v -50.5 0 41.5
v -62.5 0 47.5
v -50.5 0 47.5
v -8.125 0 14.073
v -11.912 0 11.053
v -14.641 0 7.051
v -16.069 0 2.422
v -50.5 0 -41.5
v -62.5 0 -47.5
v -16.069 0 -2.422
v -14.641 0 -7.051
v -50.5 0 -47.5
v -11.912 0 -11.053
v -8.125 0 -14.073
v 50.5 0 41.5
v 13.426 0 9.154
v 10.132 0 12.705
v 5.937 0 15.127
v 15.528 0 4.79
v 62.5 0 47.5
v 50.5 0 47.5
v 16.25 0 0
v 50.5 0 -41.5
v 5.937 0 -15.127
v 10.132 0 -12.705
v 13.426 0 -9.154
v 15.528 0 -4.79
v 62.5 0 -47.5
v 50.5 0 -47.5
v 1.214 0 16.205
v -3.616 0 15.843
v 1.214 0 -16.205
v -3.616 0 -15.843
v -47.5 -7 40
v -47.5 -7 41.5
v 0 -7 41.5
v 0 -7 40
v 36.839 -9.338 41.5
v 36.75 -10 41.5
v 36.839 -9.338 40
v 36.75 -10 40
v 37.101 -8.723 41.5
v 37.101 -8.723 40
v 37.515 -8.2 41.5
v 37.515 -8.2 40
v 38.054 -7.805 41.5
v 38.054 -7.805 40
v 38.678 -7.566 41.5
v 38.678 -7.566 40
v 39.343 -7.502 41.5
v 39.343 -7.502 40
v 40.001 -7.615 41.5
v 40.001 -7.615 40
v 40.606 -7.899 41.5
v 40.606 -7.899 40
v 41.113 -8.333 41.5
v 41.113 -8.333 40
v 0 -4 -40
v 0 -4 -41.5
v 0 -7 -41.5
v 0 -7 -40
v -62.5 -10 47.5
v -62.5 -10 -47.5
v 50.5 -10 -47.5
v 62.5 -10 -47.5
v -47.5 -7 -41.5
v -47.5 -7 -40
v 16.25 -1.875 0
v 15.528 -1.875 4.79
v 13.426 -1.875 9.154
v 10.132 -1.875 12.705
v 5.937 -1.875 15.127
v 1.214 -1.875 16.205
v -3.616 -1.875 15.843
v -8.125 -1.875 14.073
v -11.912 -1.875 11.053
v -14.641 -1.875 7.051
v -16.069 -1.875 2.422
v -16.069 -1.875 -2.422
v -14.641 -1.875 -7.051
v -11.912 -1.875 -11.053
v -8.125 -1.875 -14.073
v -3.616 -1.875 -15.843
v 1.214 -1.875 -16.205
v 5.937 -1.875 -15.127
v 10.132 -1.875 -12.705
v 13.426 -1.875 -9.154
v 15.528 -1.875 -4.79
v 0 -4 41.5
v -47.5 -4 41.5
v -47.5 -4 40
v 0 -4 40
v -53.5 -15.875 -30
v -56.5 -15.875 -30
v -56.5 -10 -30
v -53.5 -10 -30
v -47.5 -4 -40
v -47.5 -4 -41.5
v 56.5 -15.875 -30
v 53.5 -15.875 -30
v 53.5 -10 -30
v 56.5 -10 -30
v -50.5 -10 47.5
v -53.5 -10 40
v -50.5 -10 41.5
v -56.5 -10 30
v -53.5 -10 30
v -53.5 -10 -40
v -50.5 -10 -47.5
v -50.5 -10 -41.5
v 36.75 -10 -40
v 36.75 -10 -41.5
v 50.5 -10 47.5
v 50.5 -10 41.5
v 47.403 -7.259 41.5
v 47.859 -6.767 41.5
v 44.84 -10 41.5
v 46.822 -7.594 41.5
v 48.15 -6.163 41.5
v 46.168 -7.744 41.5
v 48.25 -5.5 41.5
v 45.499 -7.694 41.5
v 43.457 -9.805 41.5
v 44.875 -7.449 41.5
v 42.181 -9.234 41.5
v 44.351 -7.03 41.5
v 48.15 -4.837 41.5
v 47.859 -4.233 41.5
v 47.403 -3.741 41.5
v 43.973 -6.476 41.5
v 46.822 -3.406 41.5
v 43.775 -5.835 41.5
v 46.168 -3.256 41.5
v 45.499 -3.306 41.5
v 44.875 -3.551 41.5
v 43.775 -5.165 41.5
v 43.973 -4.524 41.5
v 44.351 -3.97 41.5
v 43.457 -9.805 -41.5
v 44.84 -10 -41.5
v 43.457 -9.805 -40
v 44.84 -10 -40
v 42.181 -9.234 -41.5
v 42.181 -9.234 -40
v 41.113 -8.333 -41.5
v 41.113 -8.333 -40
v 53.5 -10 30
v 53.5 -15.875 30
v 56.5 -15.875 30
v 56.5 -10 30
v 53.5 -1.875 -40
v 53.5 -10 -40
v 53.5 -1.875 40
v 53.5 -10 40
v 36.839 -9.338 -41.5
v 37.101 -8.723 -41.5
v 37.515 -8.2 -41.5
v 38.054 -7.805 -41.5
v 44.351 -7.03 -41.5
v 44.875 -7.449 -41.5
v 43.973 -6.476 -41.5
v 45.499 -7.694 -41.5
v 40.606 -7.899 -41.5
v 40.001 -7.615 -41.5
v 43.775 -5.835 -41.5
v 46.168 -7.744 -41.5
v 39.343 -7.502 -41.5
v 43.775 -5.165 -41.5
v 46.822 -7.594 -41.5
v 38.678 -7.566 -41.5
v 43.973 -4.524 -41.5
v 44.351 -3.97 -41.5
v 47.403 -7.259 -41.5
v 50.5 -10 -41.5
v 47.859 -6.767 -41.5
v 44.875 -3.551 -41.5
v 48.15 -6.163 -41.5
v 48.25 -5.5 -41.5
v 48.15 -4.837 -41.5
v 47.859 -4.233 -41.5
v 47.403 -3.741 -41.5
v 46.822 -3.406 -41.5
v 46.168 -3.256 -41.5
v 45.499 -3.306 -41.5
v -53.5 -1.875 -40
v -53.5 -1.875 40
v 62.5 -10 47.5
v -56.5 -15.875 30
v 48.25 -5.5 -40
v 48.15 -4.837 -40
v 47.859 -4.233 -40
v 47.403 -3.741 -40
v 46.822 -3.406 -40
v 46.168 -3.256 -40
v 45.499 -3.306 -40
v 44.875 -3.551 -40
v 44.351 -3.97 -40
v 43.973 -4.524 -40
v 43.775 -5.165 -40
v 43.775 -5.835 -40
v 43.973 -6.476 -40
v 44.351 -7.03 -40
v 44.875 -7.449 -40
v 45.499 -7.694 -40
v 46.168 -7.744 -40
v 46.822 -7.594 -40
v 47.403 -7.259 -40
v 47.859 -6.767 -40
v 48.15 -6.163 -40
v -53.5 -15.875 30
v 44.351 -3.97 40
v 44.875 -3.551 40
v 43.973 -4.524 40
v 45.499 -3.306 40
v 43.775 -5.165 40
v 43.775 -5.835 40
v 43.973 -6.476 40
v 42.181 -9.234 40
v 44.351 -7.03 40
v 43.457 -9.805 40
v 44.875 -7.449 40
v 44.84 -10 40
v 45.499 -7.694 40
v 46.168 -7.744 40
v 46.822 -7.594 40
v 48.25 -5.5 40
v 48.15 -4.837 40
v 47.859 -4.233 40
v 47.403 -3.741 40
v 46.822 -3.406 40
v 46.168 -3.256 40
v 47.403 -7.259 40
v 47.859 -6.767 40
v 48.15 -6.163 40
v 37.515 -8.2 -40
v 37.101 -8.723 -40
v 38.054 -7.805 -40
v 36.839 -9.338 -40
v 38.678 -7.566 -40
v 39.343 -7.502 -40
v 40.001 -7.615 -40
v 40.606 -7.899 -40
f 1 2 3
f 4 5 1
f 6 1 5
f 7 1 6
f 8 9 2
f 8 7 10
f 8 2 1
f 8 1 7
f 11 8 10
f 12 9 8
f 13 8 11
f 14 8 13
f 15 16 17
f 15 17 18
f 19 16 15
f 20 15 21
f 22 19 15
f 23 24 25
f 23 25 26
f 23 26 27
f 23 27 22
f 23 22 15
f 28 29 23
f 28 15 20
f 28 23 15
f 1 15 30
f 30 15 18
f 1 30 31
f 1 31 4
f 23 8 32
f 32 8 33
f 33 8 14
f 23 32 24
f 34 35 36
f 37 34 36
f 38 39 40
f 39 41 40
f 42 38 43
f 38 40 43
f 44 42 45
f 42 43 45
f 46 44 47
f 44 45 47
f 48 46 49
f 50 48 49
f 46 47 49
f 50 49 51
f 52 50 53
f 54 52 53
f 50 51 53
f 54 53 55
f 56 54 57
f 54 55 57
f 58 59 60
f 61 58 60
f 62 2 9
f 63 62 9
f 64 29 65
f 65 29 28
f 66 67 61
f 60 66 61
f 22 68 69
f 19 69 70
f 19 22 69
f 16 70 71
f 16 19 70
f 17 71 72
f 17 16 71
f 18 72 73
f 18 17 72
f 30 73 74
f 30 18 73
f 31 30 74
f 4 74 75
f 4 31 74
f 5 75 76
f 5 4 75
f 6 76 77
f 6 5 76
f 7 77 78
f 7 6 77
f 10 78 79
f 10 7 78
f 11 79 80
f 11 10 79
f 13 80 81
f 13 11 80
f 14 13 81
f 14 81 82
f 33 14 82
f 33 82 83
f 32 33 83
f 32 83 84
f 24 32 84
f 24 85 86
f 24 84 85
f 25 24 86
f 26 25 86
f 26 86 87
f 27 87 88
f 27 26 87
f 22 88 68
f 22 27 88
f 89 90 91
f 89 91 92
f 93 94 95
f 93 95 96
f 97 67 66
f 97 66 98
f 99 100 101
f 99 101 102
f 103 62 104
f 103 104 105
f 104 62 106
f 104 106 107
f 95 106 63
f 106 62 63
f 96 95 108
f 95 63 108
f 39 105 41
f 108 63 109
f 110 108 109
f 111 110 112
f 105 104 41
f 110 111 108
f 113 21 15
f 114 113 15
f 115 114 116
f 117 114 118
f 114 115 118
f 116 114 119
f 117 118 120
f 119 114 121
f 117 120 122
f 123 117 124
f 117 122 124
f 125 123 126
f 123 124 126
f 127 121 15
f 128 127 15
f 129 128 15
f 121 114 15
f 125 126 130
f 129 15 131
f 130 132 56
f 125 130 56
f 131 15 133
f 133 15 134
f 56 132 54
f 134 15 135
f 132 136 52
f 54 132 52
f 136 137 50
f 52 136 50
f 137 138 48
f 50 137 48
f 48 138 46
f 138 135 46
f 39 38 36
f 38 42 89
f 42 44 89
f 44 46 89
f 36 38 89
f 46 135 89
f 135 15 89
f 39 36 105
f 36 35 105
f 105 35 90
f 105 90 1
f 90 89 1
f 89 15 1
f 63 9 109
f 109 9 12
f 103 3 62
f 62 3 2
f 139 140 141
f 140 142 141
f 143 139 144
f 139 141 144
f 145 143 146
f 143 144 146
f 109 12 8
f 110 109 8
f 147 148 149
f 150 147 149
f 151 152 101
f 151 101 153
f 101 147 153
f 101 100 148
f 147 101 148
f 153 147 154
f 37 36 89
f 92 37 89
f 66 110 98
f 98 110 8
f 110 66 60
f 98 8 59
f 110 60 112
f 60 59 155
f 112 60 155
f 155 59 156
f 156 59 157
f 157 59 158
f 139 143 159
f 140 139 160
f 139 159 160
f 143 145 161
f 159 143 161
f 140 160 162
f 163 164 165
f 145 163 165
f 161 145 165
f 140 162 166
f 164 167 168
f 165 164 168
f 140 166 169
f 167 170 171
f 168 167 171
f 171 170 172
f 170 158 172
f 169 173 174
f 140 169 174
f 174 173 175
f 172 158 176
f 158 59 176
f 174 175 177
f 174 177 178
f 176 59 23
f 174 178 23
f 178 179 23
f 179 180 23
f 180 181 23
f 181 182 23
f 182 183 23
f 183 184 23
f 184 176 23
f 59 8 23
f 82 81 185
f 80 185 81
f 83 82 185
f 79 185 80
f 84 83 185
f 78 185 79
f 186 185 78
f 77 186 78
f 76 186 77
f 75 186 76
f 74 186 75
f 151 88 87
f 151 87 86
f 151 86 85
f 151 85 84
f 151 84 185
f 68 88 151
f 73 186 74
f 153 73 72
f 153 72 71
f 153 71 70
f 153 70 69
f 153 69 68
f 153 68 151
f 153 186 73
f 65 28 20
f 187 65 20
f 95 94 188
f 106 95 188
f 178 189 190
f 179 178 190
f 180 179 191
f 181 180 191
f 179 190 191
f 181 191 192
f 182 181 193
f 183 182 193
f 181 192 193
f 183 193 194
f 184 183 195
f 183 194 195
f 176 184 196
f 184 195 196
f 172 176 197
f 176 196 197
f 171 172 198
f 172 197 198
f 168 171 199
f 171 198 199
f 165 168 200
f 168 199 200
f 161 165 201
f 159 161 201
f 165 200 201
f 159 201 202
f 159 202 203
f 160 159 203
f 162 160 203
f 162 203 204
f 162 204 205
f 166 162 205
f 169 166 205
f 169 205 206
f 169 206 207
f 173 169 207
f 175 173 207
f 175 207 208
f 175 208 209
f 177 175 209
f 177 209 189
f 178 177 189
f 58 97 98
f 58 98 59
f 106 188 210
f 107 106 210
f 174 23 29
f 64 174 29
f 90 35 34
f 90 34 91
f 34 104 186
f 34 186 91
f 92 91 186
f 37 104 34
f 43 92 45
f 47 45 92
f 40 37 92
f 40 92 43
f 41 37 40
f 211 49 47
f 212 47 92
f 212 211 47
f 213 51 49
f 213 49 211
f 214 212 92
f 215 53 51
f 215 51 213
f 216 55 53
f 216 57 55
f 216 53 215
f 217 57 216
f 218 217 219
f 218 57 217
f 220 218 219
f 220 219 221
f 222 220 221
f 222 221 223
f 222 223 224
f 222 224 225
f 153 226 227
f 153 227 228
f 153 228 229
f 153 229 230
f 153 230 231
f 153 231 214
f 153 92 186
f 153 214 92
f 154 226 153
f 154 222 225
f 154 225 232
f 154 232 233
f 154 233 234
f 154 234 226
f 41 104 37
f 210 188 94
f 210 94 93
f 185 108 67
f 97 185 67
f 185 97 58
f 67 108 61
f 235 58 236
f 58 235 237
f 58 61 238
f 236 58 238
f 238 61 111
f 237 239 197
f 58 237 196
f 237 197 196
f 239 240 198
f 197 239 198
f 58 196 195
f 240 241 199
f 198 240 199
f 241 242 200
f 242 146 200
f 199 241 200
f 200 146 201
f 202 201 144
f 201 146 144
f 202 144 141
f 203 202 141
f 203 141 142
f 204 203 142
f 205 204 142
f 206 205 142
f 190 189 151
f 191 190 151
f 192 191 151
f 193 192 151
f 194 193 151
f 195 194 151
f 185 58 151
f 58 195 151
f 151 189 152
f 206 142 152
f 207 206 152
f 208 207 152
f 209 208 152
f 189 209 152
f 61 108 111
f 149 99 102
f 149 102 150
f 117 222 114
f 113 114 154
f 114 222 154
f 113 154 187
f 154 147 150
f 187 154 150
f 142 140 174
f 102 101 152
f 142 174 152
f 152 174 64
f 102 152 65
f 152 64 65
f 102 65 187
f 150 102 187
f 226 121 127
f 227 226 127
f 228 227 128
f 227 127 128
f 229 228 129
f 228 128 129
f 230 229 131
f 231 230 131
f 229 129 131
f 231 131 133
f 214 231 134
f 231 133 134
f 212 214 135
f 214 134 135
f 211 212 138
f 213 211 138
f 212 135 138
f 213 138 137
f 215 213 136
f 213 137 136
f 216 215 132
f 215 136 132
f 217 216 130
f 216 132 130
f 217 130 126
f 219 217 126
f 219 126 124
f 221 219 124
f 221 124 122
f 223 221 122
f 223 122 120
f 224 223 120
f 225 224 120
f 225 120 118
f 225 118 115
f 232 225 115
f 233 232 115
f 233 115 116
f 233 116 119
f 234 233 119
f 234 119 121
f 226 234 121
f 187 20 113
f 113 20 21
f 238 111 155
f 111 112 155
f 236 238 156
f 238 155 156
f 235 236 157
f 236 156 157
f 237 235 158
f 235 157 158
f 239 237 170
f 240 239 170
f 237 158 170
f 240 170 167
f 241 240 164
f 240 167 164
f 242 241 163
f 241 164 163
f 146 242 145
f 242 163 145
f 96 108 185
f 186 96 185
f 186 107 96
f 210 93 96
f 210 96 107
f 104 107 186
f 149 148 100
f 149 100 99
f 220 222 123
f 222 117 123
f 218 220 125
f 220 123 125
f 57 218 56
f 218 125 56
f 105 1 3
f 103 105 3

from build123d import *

# Parameters (mm, degrees)
F0_R      = 16.25
F1_DEPTH  = 15.875
F2_W      = 139.2096877098
F2_H      = 115.5483946204
F2_W_2    = 113
F2_H_2    = 80
F3_DEPTH  = 5.875
F4_W      = 107
F4_H      = 80
F5_DEPTH  = 14
F6_W      = 120.5911301091
F6_H      = 13.1527084535
F6_W_2    = 121.3300417974
F6_H_2    = 15.8128053223
F7_DEPTH  = 5.875
F8_R      = 1.5
F8_W      = 89
F8_H      = 3
F9_DEPTH  = 100
F10_W     = 42.4407012761
F10_H     = 10
F11_DEPTH = 1.5
F12_W     = 42.5221920013
F12_H     = 10
F13_DEPTH = 1.5
F14_R     = 2.5
F15_DEPTH = 95.5
F16_R     = 2.25
F17_DEPTH = 200
F18_R     = 5


with BuildPart() as f1:
    # F0 (on Front) → F1 (new body)
    with BuildSketch(Plane.XZ):
        Polygon((-50.5, 47.5), (-62.5, 47.5), (-62.5, -47.5), (-50.5, -47.5), (-50.5, -41.5), (50.5, -41.5), (50.5, -47.5), (62.5, -47.5), (62.5, 47.5), (50.5, 47.5), (50.5, 41.5), (-50.5, 41.5), align=None)
        Circle(F0_R, mode=Mode.SUBTRACT)
    extrude(amount=F1_DEPTH)

    # F2 (on face) → F3 (cut)
    with BuildSketch(Plane.XZ.offset(15.875)):
        Rectangle(F2_W, F2_H)
        Rectangle(F2_W_2, F2_H_2, mode=Mode.SUBTRACT)
    extrude(amount=-F3_DEPTH, mode=Mode.SUBTRACT)

    # F4 (on face) → F5 (cut)
    with BuildSketch(Plane.XZ.offset(15.875)):
        Rectangle(F4_W, F4_H)
    extrude(amount=-F5_DEPTH, mode=Mode.SUBTRACT)

    # F6 (on face) → F7 (cut)
    with BuildSketch(Plane.XZ.offset(15.875)):
        with Locations((0.0607829645, 36.5763542267)):
            Rectangle(F6_W, F6_H)
        with Locations((1.0213727103, -37.9064026611)):
            Rectangle(F6_W_2, F6_H_2)
    extrude(amount=-F7_DEPTH, mode=Mode.SUBTRACT)

    # F8 (on face) → F9 (cut)
    with BuildSketch(Plane.XY.offset(41.5)):
        with Locations((46, -5.5)):
            Circle(F8_R)
        with Locations((-3, -5.5)):
            Rectangle(F8_W, F8_H)
    extrude(amount=-F9_DEPTH, mode=Mode.SUBTRACT)

    # F10 (on face) → F11 (join)
    with BuildSketch(Plane.XY.offset(41.5)):
        with Locations((21.220350638, -5)):
            Rectangle(F10_W, F10_H)
    extrude(amount=-F11_DEPTH)

    # F12 (on face) → F13 (join)
    with BuildSketch(Plane(origin=(0, 0, -41.5), x_dir=(1, 0, 0), z_dir=(0, 0, -1))):
        with Locations((21.2610960007, 5)):
            Rectangle(F12_W, F12_H)
    extrude(amount=-F13_DEPTH)

    # F14 (on face) → F15 (cut)
    with BuildSketch(Plane(origin=(0, 0, -41.5), x_dir=(1, 0, 0), z_dir=(0, 0, -1))):
        with Locations((39.25, 10)):
            Circle(F14_R)
    extrude(amount=-F15_DEPTH, mode=Mode.SUBTRACT)

    # F16 (on face) → F17 (cut)
    with BuildSketch(Plane.XY.offset(41.5)):
        with Locations((46, -5.5)):
            Circle(F16_R)
    extrude(amount=-F17_DEPTH, mode=Mode.SUBTRACT)

    # F18
    f18_edges = [f1.edges().sort_by_distance(p)[0] for p in [
        (41.75, -10, -40.75),
        (41.75, -10, 40.75),
    ]]
    fillet(f18_edges, radius=F18_R)


solid = f1.part
